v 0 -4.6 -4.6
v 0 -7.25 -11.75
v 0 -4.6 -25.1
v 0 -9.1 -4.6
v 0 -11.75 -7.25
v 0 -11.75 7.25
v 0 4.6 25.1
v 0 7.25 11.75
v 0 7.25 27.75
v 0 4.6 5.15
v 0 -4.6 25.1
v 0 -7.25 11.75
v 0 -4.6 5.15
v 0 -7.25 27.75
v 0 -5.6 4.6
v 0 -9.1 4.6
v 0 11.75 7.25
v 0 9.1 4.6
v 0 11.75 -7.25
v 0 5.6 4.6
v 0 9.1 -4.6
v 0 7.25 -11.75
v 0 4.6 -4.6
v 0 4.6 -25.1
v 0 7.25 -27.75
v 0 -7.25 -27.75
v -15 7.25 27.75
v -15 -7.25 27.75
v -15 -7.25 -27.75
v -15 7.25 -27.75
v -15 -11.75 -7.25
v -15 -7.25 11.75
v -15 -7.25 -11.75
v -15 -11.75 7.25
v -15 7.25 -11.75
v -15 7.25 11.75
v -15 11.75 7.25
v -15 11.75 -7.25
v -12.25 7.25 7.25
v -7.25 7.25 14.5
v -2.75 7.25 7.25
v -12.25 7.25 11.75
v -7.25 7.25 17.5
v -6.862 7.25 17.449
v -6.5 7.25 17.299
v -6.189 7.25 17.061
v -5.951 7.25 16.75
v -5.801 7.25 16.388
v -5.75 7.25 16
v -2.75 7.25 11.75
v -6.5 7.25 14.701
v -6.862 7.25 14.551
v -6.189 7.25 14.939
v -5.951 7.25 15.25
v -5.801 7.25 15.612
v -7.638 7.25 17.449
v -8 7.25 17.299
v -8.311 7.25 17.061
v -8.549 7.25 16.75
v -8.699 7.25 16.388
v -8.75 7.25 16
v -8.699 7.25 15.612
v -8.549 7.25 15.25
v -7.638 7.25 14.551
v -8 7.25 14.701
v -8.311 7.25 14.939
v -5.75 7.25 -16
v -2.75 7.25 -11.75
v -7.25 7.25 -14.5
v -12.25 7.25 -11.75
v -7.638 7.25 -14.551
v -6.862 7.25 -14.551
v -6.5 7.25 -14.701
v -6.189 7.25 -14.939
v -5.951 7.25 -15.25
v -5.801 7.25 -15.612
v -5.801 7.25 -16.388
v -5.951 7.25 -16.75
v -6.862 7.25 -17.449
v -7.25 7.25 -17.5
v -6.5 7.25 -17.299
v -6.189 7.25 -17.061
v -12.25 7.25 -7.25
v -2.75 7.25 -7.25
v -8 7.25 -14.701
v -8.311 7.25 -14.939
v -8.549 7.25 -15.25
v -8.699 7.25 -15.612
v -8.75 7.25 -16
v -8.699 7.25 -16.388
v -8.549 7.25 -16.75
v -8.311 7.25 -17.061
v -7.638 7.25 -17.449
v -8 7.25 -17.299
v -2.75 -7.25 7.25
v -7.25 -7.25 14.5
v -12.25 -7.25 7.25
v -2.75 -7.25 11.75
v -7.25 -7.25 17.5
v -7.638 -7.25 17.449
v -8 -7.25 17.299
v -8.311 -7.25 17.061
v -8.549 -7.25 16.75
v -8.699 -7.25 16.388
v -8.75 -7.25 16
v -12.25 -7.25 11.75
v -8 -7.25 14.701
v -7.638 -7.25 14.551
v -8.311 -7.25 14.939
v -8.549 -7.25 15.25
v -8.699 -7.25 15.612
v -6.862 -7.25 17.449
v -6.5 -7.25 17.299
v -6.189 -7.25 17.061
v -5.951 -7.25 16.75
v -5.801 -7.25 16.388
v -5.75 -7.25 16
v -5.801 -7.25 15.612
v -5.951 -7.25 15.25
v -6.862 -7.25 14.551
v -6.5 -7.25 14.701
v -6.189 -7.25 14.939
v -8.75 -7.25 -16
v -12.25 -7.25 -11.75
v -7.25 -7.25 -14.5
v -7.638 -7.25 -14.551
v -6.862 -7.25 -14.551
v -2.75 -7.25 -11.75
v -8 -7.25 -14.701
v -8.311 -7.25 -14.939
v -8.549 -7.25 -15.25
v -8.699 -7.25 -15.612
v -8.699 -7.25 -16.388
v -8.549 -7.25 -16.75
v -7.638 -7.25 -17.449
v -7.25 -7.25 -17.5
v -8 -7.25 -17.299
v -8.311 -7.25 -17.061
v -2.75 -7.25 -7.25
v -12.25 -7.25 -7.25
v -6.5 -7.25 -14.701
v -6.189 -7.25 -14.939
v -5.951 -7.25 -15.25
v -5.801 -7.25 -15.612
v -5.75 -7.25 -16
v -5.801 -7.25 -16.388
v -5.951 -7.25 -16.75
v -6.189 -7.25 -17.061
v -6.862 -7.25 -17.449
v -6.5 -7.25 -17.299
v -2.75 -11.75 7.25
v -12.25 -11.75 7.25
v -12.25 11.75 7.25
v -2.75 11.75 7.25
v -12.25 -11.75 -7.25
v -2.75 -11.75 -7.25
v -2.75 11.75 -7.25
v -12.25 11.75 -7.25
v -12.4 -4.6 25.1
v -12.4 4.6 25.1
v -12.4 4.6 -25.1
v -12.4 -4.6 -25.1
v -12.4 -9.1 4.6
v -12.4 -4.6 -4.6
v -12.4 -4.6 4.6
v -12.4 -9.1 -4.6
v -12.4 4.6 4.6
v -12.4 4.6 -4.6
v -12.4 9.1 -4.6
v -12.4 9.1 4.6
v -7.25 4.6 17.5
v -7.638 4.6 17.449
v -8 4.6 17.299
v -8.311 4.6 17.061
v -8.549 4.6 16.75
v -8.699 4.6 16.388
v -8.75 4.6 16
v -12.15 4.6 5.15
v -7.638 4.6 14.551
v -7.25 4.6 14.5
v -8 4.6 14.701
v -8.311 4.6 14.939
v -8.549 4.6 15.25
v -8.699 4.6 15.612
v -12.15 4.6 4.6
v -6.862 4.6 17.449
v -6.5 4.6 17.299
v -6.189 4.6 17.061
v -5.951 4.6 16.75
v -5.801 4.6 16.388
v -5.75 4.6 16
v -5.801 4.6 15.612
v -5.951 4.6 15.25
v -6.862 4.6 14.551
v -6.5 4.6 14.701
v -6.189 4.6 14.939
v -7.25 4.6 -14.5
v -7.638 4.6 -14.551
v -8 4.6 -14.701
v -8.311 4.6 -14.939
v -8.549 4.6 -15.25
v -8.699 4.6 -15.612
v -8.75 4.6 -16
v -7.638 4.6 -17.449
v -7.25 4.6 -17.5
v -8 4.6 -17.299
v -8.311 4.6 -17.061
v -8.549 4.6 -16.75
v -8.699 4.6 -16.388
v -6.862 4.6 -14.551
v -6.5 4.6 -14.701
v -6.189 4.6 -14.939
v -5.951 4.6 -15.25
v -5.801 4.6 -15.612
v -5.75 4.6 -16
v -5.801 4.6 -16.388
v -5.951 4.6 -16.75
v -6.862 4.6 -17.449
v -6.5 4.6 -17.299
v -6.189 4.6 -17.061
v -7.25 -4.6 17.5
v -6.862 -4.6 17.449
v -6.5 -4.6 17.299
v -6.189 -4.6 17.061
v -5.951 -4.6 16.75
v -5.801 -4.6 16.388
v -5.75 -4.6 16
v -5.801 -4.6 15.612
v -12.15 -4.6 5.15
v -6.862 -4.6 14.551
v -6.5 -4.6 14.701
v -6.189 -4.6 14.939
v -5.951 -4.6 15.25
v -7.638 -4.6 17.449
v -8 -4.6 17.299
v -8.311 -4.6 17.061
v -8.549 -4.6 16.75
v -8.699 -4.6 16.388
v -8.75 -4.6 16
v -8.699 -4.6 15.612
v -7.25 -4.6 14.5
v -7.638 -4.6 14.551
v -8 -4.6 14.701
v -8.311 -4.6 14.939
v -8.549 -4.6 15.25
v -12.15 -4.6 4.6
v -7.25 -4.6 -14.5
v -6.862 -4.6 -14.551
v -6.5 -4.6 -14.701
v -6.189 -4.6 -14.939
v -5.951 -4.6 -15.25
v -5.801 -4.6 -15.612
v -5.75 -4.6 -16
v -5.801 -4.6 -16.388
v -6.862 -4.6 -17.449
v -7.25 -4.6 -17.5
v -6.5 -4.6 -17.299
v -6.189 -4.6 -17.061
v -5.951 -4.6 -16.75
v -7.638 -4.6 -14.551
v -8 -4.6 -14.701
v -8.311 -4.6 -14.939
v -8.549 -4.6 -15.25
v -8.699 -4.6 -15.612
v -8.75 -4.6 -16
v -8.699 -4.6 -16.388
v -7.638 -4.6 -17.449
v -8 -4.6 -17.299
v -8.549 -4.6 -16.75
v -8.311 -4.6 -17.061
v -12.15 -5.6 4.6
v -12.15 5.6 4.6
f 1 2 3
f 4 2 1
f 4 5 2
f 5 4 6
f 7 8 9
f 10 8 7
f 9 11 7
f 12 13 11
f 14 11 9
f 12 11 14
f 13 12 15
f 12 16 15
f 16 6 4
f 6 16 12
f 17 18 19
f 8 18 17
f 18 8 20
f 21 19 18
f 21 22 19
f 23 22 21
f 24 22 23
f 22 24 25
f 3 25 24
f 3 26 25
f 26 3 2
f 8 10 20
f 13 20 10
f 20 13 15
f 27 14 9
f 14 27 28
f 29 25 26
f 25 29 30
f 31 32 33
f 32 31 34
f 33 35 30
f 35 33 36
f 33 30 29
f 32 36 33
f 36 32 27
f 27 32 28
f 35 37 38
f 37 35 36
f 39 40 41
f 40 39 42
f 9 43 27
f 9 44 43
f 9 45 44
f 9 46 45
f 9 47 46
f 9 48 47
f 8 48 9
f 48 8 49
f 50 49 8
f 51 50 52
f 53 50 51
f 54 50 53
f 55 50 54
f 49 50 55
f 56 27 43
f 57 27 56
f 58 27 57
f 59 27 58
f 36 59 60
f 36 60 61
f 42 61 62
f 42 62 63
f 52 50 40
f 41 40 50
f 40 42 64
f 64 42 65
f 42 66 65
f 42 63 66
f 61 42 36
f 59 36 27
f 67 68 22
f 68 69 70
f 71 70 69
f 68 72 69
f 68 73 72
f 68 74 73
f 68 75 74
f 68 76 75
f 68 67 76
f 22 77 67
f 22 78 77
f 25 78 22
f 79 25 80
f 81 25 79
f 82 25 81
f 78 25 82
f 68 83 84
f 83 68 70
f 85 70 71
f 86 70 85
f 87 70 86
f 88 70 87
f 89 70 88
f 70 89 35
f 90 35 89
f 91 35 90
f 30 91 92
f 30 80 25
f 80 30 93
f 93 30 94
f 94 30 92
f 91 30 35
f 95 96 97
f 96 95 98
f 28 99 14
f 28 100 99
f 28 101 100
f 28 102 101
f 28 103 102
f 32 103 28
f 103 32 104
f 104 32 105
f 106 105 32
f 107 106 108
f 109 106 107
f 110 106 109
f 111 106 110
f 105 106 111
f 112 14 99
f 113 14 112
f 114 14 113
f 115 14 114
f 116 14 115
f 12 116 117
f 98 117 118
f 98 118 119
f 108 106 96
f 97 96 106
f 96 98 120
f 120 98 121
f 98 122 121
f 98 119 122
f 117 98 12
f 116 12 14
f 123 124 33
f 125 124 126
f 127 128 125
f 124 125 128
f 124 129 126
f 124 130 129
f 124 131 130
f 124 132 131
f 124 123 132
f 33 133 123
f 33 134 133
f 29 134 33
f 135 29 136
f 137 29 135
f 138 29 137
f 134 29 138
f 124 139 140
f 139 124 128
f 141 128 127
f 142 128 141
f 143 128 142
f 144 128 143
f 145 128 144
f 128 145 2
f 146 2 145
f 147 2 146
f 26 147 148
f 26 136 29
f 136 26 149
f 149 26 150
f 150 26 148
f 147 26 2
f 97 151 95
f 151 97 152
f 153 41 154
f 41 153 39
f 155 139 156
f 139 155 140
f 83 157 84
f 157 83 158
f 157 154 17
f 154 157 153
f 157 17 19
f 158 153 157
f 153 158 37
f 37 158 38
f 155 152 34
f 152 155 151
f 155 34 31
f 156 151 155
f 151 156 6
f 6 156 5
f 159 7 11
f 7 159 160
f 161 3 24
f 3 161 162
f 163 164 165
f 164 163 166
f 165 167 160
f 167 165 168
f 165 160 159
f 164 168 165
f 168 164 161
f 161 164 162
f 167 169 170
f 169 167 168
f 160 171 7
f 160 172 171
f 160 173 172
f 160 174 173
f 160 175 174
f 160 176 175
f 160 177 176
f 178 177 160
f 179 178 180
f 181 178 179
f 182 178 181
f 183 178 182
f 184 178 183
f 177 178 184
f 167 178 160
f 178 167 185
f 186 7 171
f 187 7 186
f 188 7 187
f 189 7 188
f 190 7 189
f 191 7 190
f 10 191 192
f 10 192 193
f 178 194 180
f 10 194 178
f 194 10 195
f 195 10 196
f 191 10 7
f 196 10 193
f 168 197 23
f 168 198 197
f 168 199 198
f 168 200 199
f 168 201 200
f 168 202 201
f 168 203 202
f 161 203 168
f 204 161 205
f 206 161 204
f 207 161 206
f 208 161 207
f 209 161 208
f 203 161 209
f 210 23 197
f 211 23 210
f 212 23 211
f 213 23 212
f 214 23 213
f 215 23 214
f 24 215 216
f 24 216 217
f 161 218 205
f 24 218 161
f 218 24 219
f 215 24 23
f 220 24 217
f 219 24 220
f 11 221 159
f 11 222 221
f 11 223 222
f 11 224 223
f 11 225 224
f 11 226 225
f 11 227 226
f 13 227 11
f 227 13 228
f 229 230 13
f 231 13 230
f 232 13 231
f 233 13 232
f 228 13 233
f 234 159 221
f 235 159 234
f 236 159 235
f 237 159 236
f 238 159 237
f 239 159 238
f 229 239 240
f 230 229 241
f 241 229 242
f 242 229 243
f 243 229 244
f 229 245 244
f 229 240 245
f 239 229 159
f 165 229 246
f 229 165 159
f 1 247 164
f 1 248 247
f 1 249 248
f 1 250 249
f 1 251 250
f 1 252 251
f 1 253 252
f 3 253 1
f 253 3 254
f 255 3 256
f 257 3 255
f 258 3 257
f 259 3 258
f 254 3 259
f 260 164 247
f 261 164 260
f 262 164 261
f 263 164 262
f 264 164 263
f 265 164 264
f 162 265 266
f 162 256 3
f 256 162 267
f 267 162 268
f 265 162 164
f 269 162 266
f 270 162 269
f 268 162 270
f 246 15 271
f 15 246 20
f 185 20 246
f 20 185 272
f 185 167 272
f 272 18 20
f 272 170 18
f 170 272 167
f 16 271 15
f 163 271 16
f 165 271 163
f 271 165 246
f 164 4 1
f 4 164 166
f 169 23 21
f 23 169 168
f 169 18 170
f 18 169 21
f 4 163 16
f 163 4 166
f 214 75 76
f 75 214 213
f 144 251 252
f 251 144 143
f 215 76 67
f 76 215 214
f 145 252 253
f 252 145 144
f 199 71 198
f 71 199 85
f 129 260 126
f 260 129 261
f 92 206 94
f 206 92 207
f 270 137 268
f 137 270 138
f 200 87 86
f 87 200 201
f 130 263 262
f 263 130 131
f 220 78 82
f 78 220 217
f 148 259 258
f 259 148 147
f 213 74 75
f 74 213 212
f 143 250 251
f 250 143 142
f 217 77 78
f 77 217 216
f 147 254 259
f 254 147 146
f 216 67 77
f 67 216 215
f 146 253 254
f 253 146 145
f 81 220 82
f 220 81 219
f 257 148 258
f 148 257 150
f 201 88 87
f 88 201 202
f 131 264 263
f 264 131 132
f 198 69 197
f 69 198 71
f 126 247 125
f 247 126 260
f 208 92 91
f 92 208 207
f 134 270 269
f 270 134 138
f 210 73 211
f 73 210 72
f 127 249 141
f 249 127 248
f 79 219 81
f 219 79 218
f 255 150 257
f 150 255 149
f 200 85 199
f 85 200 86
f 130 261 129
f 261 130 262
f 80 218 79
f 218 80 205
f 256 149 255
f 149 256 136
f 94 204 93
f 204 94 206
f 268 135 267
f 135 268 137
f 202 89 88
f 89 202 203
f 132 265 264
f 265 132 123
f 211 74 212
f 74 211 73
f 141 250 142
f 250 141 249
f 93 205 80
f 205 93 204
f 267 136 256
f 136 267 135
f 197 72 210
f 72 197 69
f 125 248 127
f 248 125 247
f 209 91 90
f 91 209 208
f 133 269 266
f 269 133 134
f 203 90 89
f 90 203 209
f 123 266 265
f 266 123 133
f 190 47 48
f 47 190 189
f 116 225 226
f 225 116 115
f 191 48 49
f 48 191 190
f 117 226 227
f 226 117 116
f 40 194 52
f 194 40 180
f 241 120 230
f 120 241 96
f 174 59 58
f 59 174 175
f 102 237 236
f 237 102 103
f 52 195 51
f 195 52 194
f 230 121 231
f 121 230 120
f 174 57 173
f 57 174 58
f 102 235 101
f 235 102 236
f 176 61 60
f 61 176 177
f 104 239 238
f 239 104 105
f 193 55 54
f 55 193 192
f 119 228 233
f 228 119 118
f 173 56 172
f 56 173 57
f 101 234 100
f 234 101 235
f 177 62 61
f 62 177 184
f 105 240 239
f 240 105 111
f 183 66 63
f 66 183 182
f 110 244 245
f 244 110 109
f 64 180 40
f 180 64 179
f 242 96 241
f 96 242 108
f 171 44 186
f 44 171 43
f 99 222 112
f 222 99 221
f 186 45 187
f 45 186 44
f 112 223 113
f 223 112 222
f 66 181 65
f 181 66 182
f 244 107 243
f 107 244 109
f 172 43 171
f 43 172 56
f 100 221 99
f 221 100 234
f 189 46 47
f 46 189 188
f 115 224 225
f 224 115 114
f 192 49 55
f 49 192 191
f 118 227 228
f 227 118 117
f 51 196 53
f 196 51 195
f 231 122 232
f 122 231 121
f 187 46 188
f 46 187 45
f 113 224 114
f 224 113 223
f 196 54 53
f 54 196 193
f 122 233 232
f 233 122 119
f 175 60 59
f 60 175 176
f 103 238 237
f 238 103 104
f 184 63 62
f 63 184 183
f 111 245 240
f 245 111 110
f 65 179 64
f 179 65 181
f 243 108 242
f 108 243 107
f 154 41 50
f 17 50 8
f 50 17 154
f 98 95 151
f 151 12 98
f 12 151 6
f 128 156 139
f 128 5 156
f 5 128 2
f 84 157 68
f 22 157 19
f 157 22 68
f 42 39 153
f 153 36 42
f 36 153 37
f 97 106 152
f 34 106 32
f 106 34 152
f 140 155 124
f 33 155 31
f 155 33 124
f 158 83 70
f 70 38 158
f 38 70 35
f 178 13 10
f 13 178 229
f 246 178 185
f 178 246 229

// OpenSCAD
/*
*************************************************************************
    This program is free software: you can redistribute it and/or modify
    it under the terms of the GNU General Public License as published by
    the Free Software Foundation, either version 3 of the License, or
    (at your option) any later version.

    This program is distributed in the hope that it will be useful,
    but WITHOUT ANY WARRANTY; without even the implied warranty of
    MERCHANTABILITY or FITNESS FOR A PARTICULAR PURPOSE.  See the
    GNU General Public License for more details.

    You should have received a copy of the GNU General Public License
    along with this program.  If not, see <http://www.gnu.org/licenses/>.
************************************************************************* 
*/

/*
Description:

A basic holder female end for the Ultimaker 3D Printer.

You will need to print and mount this first:
"Ultimaker Generic HeadMount" http://www.thingiverse.com/thing:20775

This part is a basic design for a holder part, it's a template so to say.

*/


//############################################################
//Fix up circles
$fs = 0.4; $fa = 5;
eps = 0.025;

clear = 0.1; // clearance 

// ########################


// PARAMETERS FOR THE COUPLING: 
// (do not change unless you change the male part too)
mountdepth = 12.25;

// width & length of vertical male coupling bar
wmountvert = 9; 
lmountvert = 50;
// width & length of horizontal male coupling bar
wmounthoriz = 9;
lmounthoriz = 18;

screwposz = 16; // vertical position of screws from center
//##########################################################
// PARAMETERS FOR THE HOLDER <<<<<<<<<<<<<<<<<<<<<<<<<<<<<<<<<<<<<<<<<<<<
tside = 2.75; // main coupling thickness
tmembrane = 0.55; // cut this mambrane away after printing
// ##############################################

femalecoupling();

// ##############################################

module femalecoupling()
{
	difference() {
		union() {
			translate([-mountdepth/2-tside/2,0,0]) cube([mountdepth+tside,wmountvert+tside*2, lmountvert+tside*2], center=true);
			translate([-mountdepth/2-tside/2,0,0]) cube([mountdepth+tside,lmounthoriz+tside*2,wmounthoriz+tside*2], center=true);
		}
		translate([-mountdepth/2-clear/2,0,0]) cube([mountdepth+clear*2,wmountvert+clear*2, lmountvert+clear*2], center=true);
		translate([-mountdepth/2-clear/2,0,0]) cube([mountdepth+clear*2,lmounthoriz+clear*2,wmounthoriz+clear*2], center=true);

		//holes for screws
		translate([-mountdepth+5,0,-screwposz]) rotate(90,[1,0,0])
			cylinder(r=3/2,h=wmountvert+tside*2+clear,center=true);
		translate([-mountdepth+5,0,+screwposz]) rotate(90,[1,0,0])
			cylinder(r=3/2,h=wmountvert+tside*2+clear,center=true);
	}

	// printing support membrane
	color([0.8,0.8,0.8])
	translate([-(mountdepth)/2+0.05, 0 , tmembrane/2+wmounthoriz/2+clear])
	cube([(mountdepth-0.1),wmounthoriz+clear*2+2,tmembrane],center=true);
	
	scale([1, 1, 1]) translate([-tside,wmountvert/2+tside,wmounthoriz/2+tside]) wedge(tside, (lmounthoriz - wmountvert) / 2);
	scale([1,-1, 1]) translate([-tside,wmountvert/2+tside,wmounthoriz/2+tside]) wedge(tside, (lmounthoriz - wmountvert) / 2);
	scale([1,-1,-1]) translate([-tside,wmountvert/2+tside,wmounthoriz/2+tside]) wedge(tside, (lmounthoriz - wmountvert) / 2);
	scale([1, 1,-1]) translate([-tside,wmountvert/2+tside,wmounthoriz/2+tside]) wedge(tside, (lmounthoriz - wmountvert) / 2);

	scale([1, 1, 1]) translate([-mountdepth-tside,wmountvert/2+tside,wmounthoriz/2+tside]) wedge(tside, (lmounthoriz - wmountvert) / 2);
	scale([1,-1, 1]) translate([-mountdepth-tside,wmountvert/2+tside,wmounthoriz/2+tside]) wedge(tside, (lmounthoriz - wmountvert) / 2);
	scale([1,-1,-1]) translate([-mountdepth-tside,wmountvert/2+tside,wmounthoriz/2+tside]) wedge(tside, (lmounthoriz - wmountvert) / 2);
	scale([1, 1,-1]) translate([-mountdepth-tside,wmountvert/2+tside,wmounthoriz/2+tside]) wedge(tside, (lmounthoriz - wmountvert) / 2);

	% translate([tside,0,0]) translate([0,0,-25]) rotate(-45,[0,0,1]) render() forbiddenregions();
}

module wedge(x, y)
{
	intersection() {
		translate([0,-eps,-eps]) cube([x, y+eps, y+eps]);
		rotate([0,90,0]) cylinder(r=y,h=x, $fn=4);
	}
}

//##############################
//##############################
// these are crude bounding boxes for the axes
module forbiddenregions()
{
  translate([16/2+15,0,50/2])  // 15
  cube([16,60,50],center=true);
  translate([0,16/2+15,50/2])  // 15
  cube([60,16,50],center=true);
}
